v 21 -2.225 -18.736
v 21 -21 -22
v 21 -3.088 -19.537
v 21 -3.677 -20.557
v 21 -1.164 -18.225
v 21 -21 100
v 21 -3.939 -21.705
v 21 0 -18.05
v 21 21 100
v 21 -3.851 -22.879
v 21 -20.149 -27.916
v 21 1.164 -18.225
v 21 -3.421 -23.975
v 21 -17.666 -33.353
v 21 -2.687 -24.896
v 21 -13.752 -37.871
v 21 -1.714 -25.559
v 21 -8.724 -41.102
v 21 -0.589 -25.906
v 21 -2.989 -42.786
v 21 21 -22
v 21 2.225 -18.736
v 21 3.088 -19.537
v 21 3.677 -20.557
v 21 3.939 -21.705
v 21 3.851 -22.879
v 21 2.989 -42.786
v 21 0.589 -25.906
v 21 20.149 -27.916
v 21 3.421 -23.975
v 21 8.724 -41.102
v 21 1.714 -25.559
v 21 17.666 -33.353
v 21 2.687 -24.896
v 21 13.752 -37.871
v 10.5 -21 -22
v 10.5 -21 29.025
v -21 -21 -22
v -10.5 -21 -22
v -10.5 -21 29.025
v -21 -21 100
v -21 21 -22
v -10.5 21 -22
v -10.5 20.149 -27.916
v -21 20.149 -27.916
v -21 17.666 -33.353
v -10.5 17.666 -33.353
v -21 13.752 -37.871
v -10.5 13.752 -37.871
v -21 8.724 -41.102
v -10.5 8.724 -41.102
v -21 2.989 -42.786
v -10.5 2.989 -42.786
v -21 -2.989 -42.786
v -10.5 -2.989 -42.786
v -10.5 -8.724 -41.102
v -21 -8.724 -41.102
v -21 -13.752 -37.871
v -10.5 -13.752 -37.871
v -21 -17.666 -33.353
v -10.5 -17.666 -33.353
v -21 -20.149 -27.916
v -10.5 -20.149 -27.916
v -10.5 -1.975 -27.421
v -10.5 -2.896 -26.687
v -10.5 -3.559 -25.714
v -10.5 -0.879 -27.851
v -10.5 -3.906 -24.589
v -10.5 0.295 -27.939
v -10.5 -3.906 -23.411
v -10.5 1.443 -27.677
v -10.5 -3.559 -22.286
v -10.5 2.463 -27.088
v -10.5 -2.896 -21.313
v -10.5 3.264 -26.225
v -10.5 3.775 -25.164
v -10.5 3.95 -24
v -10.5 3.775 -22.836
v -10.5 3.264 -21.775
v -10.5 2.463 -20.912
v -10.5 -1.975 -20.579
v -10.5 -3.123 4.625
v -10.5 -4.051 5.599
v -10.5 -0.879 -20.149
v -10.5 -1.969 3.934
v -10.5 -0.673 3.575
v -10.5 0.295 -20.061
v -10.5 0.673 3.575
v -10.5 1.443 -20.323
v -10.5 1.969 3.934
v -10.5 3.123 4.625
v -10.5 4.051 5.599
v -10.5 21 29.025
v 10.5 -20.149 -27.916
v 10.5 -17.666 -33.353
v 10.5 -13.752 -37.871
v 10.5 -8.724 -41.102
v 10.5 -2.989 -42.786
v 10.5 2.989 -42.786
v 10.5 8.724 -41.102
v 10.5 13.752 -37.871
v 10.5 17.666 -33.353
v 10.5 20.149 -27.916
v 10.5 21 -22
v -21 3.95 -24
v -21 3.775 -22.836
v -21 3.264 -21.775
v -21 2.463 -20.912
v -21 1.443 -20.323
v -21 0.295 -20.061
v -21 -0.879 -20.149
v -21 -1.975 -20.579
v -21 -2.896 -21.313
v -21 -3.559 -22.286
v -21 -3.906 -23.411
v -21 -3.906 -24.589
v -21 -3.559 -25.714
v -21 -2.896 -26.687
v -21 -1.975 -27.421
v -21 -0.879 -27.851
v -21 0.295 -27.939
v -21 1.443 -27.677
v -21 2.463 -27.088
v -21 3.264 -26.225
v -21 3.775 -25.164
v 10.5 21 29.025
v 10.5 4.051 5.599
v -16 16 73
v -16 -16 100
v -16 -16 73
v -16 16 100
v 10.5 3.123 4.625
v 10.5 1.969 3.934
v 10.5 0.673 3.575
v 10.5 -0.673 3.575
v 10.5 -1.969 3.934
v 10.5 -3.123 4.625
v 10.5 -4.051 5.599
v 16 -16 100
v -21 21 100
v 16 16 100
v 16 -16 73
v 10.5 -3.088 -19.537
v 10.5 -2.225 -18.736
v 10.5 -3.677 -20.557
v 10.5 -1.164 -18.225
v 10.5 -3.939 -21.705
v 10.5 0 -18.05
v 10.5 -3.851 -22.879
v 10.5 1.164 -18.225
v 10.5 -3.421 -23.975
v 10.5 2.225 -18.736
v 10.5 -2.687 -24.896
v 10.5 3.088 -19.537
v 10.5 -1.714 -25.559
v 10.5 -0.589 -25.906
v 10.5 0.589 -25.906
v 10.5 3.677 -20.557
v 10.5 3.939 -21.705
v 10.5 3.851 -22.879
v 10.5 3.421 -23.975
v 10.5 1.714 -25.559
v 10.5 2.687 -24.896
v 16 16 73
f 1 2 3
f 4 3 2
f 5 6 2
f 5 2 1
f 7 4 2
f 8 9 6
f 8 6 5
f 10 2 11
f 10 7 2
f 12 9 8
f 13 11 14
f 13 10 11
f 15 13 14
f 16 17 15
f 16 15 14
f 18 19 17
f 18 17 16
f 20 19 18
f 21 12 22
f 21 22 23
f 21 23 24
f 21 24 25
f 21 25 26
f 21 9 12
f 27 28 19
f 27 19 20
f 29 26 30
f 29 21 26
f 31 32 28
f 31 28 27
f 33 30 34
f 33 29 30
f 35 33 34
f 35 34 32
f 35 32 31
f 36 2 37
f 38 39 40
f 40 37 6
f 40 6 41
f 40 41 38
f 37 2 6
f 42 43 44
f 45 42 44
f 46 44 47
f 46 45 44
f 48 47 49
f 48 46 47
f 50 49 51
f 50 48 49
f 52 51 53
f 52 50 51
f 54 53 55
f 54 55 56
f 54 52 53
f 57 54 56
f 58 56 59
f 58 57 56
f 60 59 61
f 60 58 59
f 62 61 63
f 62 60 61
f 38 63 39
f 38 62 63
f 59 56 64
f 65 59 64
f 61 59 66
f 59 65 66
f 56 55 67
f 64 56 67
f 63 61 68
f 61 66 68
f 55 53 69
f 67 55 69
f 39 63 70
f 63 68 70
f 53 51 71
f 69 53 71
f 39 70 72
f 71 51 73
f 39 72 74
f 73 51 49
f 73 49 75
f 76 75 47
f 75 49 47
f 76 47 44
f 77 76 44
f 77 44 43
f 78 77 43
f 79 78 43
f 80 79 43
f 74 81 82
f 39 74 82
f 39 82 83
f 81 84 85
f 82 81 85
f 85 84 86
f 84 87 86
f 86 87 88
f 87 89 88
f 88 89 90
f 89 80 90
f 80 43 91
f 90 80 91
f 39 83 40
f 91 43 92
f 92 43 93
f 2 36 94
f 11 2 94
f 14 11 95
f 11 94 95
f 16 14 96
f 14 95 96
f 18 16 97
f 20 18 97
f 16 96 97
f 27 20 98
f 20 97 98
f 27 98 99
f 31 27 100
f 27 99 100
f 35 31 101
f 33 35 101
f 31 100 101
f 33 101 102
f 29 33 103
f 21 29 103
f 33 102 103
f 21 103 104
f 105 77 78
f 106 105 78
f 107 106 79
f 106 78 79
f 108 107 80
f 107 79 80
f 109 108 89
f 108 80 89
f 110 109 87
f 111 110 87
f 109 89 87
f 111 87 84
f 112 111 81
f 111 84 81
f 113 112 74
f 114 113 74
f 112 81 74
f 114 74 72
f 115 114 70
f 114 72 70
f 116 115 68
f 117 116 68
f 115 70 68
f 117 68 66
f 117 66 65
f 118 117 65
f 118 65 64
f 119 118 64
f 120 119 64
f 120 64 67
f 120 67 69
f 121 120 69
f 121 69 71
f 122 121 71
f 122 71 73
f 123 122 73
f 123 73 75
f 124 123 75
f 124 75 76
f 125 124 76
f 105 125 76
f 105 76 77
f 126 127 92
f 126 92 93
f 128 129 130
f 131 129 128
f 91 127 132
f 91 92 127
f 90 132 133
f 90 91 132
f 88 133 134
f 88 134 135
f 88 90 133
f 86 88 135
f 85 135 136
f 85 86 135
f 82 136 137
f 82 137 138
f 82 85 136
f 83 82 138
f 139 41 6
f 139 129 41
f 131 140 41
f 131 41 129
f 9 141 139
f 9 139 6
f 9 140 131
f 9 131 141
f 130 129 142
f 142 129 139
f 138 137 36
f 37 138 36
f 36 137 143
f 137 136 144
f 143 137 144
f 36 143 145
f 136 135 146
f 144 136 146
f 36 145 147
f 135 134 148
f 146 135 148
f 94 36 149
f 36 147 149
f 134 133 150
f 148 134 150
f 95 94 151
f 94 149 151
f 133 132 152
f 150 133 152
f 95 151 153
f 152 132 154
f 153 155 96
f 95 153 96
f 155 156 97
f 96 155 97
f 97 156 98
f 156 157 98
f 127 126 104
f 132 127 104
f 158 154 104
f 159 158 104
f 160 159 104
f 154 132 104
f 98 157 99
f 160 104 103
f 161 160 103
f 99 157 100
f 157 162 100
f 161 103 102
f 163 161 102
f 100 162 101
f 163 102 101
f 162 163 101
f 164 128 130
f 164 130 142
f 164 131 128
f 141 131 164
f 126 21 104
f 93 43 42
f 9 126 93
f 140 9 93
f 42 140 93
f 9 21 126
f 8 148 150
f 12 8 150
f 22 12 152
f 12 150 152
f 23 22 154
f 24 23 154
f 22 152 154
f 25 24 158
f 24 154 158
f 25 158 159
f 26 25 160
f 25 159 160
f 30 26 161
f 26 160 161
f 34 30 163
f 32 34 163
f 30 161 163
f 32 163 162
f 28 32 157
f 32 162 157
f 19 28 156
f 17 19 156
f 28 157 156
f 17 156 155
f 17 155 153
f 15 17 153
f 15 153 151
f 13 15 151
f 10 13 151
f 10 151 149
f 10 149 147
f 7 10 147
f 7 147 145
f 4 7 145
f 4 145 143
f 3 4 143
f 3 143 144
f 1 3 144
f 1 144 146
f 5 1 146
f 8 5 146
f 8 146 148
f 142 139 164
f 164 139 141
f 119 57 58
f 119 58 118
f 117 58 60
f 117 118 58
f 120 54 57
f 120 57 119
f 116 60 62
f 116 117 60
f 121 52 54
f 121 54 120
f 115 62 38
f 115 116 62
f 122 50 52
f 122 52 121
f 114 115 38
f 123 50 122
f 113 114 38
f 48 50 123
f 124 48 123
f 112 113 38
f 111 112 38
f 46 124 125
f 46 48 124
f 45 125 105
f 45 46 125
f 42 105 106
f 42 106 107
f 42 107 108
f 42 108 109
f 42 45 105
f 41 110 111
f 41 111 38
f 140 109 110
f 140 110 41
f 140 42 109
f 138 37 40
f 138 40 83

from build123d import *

# Parameters (mm, degrees)
SKETCH2_W           = 42
SKETCH2_H           = 42
BOSS_EXTRUDE1_DEPTH = 100
SKETCH3_W           = 10.5
SKETCH3_H           = 42
BOSS_EXTRUDE2_DEPTH = 22
BOSS_EXTRUDE3_DEPTH = 10.5
BOSS_EXTRUDE4_START = -10.5
BOSS_EXTRUDE4_DEPTH = 10.5
SKETCH6_W           = 32
SKETCH6_H           = 32
CUT_EXTRUDE1_DEPTH  = 27
SKETCH7_R           = 3.95
CUT_EXTRUDE2_DEPTH  = 107.92637654
SKETCH9_R           = 3.95
CUT_EXTRUDE3_DEPTH  = 107.92637654
CUT_EXTRUDE4_DEPTH  = 21
FILLET1_R           = 5


with BuildPart() as part:
    # Sketch2 → Boss-Extrude1 (new body)
    with BuildSketch(Plane.XY):
        Rectangle(SKETCH2_W, SKETCH2_H)
    extrude(amount=BOSS_EXTRUDE1_DEPTH)

    # Sketch3 → Boss-Extrude2 (add)
    with BuildSketch(Plane(origin=(0, 0, 0), x_dir=(-1, 0, 0), z_dir=(0, 0, -1))):
        with Locations((15.75, 0)):
            Rectangle(SKETCH3_W, SKETCH3_H)
        with Locations((-15.75, 0)):
            Rectangle(SKETCH3_W, SKETCH3_H)
    extrude(amount=BOSS_EXTRUDE2_DEPTH)

    # Sketch4 → Boss-Extrude3 (add)
    with BuildSketch(Plane.ZY.offset(21)):
        with BuildLine():
            Line((-22, -21), (-22, 21))
            ThreePointArc((-22, 21), (-43, 0), (-22, -21))
        make_face()
    extrude(amount=-BOSS_EXTRUDE3_DEPTH)

    # Sketch5 → Boss-Extrude4 (add)
    with BuildSketch(Plane(origin=(21, 0, 0), x_dir=(0, 0, -1), z_dir=(1, 0, 0)).offset(BOSS_EXTRUDE4_START)):
        with BuildLine():
            Line((22, 21), (22, -21))
            ThreePointArc((22, -21), (43, 0), (22, 21))
        make_face()
    extrude(amount=BOSS_EXTRUDE4_DEPTH)

    # Sketch6 → Cut-Extrude1 (cut)
    with BuildSketch(Plane.XY.offset(100)):
        Rectangle(SKETCH6_W, SKETCH6_H)
    extrude(amount=-CUT_EXTRUDE1_DEPTH, mode=Mode.SUBTRACT)

    # Sketch7 → Cut-Extrude2 (cut, through all)
    with BuildSketch(Plane.ZY.offset(-10.5)):
        with Locations((-22, 0)):
            Circle(SKETCH7_R)
    extrude(amount=-CUT_EXTRUDE2_DEPTH, mode=Mode.SUBTRACT)

    # Sketch9 → Cut-Extrude3 (cut, through all)
    with BuildSketch(Plane(origin=(-10.5, 0, 0), x_dir=(0, 0, -1), z_dir=(1, 0, 0))):
        with Locations(Location((24, 0, 0), (0, 0, 90))):
            Circle(SKETCH9_R)
    extrude(amount=-CUT_EXTRUDE3_DEPTH, mode=Mode.SUBTRACT)

    # Sketch11 → Cut-Extrude4 (cut)
    with BuildSketch(Plane.ZY.offset(-10.5)):
        Polygon((0, 21), (0, 0), (29.025198915, 21), align=None)
        Polygon((29.025198915, -21), (0, 0), (0, -21), align=None)
    extrude(amount=CUT_EXTRUDE4_DEPTH, mode=Mode.SUBTRACT)

    # Fillet1
    fillet1_edges = [part.edges().sort_by_distance(p)[0] for p in [
        (0, 0, 0),
    ]]
    fillet(fillet1_edges, radius=FILLET1_R)


solid = part.part
